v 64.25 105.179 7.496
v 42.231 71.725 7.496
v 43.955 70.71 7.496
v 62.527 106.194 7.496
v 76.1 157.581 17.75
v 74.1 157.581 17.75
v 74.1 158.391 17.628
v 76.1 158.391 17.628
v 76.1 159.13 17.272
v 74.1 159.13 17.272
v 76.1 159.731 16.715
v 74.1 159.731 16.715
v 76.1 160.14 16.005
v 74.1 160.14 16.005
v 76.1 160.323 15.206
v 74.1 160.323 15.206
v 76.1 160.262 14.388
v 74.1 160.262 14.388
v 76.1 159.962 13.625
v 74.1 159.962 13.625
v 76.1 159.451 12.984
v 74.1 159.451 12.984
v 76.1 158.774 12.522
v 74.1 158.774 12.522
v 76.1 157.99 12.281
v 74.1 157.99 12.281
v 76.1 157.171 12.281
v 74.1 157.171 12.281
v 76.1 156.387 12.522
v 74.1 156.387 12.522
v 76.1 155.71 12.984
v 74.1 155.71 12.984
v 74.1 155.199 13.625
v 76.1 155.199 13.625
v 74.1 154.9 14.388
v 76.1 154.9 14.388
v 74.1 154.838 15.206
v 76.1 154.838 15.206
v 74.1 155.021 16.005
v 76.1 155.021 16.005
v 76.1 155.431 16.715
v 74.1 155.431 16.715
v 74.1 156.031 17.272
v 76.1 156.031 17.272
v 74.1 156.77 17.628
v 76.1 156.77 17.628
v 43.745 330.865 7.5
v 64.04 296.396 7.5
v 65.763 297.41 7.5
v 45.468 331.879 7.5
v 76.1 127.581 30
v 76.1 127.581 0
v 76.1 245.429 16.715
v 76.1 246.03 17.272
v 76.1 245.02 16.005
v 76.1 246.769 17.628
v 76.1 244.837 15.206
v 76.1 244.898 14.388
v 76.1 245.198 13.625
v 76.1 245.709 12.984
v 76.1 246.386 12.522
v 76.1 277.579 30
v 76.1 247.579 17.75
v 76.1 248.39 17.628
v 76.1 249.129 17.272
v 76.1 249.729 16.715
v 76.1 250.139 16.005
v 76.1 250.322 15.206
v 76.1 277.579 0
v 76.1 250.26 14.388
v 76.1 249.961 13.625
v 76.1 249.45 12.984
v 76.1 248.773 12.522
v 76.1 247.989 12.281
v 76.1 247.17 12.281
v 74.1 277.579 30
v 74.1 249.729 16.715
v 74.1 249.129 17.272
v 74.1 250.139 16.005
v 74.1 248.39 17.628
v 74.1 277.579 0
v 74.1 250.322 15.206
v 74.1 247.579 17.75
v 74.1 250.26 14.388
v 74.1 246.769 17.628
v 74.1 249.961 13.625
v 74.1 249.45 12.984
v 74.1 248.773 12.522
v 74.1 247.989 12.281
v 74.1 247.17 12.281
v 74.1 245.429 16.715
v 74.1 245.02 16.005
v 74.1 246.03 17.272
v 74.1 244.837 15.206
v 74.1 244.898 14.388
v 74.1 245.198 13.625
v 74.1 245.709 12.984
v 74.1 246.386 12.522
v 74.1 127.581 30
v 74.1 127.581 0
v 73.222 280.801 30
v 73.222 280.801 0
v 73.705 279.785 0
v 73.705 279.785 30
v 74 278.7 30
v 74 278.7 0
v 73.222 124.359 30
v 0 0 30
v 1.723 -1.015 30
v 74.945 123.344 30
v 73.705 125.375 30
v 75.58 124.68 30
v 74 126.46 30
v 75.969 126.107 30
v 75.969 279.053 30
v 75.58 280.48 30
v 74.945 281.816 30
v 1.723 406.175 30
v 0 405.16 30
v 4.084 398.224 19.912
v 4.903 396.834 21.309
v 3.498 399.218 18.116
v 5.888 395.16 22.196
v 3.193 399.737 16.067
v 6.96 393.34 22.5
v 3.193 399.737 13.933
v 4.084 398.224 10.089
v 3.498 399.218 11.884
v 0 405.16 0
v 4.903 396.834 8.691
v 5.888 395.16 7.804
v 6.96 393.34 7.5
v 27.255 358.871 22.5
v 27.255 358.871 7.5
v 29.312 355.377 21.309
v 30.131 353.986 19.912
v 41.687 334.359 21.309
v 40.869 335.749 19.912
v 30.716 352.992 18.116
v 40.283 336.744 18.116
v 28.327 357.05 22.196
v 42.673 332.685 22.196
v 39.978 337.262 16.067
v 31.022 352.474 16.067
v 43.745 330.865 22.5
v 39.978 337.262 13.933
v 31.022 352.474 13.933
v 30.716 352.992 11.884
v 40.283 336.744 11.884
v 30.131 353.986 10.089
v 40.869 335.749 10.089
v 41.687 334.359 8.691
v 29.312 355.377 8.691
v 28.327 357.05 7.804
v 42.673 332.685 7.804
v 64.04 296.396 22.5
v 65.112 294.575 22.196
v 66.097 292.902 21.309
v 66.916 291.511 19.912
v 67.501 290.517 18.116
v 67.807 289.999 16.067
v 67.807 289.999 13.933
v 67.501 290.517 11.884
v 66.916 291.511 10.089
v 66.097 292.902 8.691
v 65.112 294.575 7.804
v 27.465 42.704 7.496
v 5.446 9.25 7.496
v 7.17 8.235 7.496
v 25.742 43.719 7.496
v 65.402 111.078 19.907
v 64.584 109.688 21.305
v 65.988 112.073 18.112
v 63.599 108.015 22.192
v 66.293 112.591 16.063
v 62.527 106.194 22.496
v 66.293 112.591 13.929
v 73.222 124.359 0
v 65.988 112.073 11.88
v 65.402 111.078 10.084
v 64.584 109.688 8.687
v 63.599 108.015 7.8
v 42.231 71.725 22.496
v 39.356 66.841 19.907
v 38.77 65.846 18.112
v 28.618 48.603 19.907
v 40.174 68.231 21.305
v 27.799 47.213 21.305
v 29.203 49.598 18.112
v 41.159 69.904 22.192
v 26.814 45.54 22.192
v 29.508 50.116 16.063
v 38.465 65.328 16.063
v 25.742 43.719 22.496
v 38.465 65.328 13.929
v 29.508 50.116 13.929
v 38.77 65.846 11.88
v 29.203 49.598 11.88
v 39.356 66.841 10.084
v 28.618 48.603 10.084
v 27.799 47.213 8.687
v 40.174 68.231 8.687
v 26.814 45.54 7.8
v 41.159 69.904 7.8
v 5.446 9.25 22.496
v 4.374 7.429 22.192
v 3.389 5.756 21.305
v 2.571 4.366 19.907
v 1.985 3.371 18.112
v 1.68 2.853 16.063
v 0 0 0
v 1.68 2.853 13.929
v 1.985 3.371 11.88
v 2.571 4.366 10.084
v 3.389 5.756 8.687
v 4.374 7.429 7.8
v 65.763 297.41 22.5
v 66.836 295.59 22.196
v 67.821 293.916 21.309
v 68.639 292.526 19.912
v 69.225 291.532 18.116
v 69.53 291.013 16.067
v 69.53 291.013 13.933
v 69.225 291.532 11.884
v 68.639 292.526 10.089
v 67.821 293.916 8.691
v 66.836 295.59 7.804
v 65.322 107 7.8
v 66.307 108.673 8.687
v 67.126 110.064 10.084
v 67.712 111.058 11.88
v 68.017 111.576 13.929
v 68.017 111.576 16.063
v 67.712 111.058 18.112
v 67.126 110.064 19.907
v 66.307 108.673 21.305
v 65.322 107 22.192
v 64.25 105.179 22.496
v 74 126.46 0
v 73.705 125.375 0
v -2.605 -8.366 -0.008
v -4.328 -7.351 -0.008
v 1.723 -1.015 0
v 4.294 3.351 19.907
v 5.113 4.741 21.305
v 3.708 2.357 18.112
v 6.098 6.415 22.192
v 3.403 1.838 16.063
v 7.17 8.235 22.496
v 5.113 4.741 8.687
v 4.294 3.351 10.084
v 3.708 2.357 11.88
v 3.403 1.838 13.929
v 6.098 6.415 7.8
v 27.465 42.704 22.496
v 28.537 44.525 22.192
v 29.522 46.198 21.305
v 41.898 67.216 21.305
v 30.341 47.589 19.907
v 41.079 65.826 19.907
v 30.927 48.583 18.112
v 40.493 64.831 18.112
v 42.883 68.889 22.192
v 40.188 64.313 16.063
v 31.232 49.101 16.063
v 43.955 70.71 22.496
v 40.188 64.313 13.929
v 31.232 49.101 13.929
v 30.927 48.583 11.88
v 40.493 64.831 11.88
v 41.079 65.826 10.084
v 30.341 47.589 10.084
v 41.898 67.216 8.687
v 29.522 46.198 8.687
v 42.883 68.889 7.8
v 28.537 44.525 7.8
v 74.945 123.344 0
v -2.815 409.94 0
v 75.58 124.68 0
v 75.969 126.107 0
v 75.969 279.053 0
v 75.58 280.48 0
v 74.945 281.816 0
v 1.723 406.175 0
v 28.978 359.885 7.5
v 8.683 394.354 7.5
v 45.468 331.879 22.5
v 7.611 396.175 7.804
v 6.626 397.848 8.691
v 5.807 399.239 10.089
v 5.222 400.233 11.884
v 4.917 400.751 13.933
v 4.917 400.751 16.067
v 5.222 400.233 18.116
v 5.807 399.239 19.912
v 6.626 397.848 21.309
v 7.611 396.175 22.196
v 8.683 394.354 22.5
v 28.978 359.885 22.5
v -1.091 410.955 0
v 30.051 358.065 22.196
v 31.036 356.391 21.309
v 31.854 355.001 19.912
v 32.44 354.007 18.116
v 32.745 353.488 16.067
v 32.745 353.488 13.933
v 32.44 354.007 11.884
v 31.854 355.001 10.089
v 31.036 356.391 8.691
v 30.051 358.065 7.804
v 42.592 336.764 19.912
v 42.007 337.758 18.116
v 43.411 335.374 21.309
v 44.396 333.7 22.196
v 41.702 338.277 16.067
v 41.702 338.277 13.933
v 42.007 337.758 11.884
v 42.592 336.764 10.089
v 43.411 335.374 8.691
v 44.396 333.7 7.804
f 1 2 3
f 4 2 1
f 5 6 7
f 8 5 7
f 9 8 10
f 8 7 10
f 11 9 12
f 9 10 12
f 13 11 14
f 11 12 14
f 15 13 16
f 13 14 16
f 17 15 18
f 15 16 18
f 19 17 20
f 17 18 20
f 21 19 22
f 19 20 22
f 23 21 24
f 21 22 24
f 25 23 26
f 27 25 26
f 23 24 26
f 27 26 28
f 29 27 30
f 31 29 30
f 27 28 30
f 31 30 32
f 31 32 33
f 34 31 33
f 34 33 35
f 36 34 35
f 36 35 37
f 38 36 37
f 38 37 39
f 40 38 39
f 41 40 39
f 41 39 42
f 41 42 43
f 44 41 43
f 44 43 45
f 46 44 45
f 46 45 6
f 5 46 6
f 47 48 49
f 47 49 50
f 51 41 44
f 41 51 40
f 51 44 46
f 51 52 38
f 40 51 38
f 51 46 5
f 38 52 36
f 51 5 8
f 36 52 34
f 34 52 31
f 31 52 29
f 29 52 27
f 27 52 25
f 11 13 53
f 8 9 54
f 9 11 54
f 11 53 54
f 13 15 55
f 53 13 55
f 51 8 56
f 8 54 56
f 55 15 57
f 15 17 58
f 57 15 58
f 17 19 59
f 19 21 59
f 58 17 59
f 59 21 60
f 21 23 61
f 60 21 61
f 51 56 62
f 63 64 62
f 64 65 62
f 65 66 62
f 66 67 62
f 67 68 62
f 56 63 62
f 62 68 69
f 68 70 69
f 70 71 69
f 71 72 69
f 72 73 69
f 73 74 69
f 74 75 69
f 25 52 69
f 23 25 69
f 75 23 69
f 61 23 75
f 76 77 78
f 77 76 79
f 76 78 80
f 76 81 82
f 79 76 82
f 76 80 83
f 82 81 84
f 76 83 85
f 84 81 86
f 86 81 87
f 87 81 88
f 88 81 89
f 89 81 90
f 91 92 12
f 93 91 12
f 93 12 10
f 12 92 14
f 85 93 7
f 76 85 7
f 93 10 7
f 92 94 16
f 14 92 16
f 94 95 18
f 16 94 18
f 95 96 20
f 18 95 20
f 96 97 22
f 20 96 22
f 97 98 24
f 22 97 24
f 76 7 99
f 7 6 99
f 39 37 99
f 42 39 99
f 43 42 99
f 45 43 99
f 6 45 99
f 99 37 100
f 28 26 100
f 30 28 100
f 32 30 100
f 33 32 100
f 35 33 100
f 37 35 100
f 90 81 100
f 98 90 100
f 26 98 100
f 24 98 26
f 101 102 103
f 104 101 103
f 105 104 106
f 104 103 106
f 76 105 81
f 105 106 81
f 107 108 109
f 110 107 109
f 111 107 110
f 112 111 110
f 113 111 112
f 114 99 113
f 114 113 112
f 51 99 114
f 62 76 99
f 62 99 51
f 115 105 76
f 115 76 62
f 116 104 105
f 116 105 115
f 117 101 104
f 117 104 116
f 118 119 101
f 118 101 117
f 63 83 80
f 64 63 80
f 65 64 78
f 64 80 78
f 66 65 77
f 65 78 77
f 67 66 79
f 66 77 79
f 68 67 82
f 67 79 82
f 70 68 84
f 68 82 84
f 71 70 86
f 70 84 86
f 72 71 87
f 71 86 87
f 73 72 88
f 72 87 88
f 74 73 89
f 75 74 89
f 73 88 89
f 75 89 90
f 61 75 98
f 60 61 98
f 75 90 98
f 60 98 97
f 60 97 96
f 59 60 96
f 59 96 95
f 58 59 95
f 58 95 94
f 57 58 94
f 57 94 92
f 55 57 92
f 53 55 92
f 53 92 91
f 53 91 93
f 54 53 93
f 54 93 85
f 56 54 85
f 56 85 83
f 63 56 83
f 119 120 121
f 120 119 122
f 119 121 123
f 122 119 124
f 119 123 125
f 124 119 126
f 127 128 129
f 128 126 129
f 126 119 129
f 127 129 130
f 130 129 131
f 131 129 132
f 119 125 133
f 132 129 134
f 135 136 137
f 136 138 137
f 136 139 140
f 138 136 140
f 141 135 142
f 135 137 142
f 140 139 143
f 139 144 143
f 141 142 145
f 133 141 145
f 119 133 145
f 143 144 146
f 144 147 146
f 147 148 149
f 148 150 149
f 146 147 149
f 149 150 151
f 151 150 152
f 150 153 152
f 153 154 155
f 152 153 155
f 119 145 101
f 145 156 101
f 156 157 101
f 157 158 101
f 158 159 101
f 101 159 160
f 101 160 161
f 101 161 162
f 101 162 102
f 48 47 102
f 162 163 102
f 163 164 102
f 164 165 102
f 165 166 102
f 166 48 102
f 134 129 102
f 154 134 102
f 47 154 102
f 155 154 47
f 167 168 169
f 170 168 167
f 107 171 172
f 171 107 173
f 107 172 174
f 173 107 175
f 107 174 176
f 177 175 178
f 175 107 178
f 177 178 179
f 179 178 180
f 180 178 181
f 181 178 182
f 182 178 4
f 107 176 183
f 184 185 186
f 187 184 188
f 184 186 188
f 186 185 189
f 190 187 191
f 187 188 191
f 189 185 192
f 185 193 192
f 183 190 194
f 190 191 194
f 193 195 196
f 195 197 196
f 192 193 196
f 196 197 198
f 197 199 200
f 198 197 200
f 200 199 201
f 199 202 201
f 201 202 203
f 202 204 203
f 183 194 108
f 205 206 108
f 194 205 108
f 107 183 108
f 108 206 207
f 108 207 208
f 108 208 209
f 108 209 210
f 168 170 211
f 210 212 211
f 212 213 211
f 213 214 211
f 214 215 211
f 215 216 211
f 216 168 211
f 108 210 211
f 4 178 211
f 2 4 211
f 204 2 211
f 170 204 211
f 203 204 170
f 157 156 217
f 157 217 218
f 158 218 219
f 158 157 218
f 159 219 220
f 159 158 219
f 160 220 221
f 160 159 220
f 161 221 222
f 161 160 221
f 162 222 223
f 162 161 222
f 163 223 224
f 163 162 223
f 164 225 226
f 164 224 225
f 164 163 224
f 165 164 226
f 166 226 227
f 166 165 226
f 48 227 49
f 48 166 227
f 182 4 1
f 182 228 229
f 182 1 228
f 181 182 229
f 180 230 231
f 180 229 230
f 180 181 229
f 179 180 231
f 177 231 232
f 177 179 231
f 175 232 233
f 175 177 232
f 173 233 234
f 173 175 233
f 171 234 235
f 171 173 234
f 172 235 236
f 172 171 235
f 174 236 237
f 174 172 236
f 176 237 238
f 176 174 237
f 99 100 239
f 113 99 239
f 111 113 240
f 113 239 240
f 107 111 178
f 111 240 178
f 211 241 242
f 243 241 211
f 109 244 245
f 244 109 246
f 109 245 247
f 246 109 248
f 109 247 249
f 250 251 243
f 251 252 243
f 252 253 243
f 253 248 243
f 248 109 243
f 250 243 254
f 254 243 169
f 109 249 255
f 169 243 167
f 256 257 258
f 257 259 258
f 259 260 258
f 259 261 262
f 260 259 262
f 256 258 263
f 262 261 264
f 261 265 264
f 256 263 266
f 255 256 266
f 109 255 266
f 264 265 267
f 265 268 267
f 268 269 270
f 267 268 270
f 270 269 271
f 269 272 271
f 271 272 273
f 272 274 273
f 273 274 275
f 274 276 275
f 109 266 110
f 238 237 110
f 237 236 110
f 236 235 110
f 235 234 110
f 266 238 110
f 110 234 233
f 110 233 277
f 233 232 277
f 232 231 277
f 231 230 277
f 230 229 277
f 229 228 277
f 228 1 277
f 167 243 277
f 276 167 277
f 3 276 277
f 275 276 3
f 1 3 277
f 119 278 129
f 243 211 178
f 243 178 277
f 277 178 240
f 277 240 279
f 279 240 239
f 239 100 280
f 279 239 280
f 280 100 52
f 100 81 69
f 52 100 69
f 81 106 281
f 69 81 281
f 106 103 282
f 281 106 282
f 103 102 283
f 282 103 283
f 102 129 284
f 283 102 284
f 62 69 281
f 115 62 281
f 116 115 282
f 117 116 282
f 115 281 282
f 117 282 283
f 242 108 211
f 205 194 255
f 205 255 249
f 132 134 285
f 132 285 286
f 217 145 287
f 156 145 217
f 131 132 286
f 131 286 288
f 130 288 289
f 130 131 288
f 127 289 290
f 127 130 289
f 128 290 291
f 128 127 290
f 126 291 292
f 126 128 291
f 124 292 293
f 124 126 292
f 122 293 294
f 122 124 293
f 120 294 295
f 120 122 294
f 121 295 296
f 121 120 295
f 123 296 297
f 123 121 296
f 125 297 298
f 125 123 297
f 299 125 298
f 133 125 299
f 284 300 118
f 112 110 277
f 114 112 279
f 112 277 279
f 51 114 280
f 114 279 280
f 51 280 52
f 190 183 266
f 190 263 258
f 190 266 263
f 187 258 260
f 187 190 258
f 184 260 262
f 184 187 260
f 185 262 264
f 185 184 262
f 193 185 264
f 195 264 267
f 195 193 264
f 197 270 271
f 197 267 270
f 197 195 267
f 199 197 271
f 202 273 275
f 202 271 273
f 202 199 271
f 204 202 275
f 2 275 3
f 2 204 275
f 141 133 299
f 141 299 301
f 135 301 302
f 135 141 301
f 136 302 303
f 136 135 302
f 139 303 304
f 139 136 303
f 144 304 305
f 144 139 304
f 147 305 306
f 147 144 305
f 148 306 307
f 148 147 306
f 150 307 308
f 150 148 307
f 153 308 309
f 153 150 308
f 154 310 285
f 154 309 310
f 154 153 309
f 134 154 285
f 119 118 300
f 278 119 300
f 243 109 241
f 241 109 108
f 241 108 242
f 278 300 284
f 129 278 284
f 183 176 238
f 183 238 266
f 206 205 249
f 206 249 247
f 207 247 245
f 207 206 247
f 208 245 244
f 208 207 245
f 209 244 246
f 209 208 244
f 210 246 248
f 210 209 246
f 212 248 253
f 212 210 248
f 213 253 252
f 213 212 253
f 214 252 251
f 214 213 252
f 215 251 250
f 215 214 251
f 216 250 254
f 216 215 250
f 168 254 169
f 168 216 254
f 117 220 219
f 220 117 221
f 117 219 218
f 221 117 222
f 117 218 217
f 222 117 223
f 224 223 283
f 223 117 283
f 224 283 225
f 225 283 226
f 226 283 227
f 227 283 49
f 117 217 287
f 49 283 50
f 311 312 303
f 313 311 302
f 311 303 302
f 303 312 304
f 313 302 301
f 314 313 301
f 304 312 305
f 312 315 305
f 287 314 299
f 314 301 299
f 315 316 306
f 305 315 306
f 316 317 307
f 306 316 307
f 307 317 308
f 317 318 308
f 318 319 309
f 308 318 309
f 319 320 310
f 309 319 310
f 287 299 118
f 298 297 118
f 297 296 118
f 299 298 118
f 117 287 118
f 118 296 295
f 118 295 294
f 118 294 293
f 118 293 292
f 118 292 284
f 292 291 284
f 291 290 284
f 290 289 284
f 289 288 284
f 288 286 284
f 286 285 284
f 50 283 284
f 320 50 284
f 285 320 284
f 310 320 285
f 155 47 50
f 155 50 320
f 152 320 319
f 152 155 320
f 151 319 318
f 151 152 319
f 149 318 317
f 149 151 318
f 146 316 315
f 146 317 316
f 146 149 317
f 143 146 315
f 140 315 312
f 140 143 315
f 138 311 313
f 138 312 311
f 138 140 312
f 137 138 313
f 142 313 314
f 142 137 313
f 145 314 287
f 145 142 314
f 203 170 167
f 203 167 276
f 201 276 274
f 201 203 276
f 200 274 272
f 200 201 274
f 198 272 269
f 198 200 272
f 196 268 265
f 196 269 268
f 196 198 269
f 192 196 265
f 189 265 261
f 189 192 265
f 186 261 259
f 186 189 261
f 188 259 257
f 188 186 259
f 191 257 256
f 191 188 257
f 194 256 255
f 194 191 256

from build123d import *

# Parameters (mm, degrees)
ODGI_CIE_BAZOWE1_DEPTH      = 30
OTW_R_POD_RUB_M51_D         = 5.5
OTW_R_POD_RUB_M51_DEPTH     = 14
OTW_R_POD_RUB_M51_TIP       = 1.652366702
DODANIE_WYCI_GNI_CIE1_DEPTH = 2
DODANIE_WYCI_GNI_CIE2_DEPTH = 2
WYTNIJ_WYCI_GNI_CIE1_DEPTH  = 10
WYTNIJ_WYCI_GNI_CIE3_DEPTH  = 10


# Sheet-metal steps are written as plain solids
with BuildPart() as part:
    # Szkic1 → Odgięcie bazowe1 (new body)
    with BuildSketch(Plane.XY):
        with BuildLine():
            Line((0, 405.16), (73.22194051, 280.801279174))
            ThreePointArc((73.22194051, 280.801279174), (73.876553772, 279.249103741), (74.1, 277.579421472))
            Line((74.1, 277.579421472), (74.1, 127.580578528))
            ThreePointArc((74.1, 127.580578528), (73.876553772, 125.910896259), (73.22194051, 124.358720826))
            Line((73.22194051, 124.358720826), (0, 0))
            Line((0, 0), (1.72344583, -1.014758331))
            Line((1.72344583, -1.014758331), (74.94538634, 123.343962495))
            ThreePointArc((74.94538634, 123.343962495), (75.806177007, 125.38501208), (76.1, 127.580578528))
            Line((76.1, 127.580578528), (76.1, 277.579421472))
            ThreePointArc((76.1, 277.579421472), (75.806177007, 279.77498792), (74.94538634, 281.816037505))
            Line((74.94538634, 281.816037505), (1.72344583, 406.174758331))
            Line((1.72344583, 406.174758331), (0, 405.16))
        make_face()
    extrude(amount=ODGI_CIE_BAZOWE1_DEPTH)

    # Otwór pod śrubę M51
    with Locations(Plane(origin=(76.1, 0, 0), x_dir=(0, 0, -1), z_dir=(1, 0, 0))):
        with Locations((-15, 157.580578528), (-15, 247.579421472)):
            Hole(OTW_R_POD_RUB_M51_D / 2, depth=OTW_R_POD_RUB_M51_DEPTH)
            with Locations((0, 0, -(OTW_R_POD_RUB_M51_DEPTH + OTW_R_POD_RUB_M51_TIP / 2))):  # 118° drill point
                Cone(0, OTW_R_POD_RUB_M51_D / 2, OTW_R_POD_RUB_M51_TIP, mode=Mode.SUBTRACT)

    # Szkic10 → Dodanie-wyciągnięcie1 (add)
    with BuildSketch(Plane(origin=(178.867603803, 105.316562907, 0), x_dir=(0, 0, -1), z_dir=(0.8617229149967045, 0.5073791656833994, 0))):
        Polygon((-30, 349.13565624), (-0.000160653, 354.682794047), (0, 349.13565624), align=None)
    extrude(amount=-DODANIE_WYCI_GNI_CIE1_DEPTH)

    # Szkic11 → Dodanie-wyciągnięcie2 (add)
    with BuildSketch(Plane(origin=(1.72344583, -1.014758331, 0), x_dir=(0, 0, -1), z_dir=(0.8617229149967046, -0.507379165683399, 0))):
        Polygon((-30, 0), (0.008092813, -8.531045483), (0, 0), align=None)
    extrude(amount=-DODANIE_WYCI_GNI_CIE2_DEPTH)

    # Szkic13 → Wytnij-wyciągnięcie1 (cut)
    with BuildSketch(Plane(origin=(0, 0, 0), x_dir=(0, 0, 1), z_dir=(-0.8617229149967046, 0.5073791656833994, 0))):
        with BuildLine():
            Line((7.495953593, 10.734477259), (7.495953593, 50.734477259))
            ThreePointArc((7.495953593, 50.734477259), (14.995953593, 58.234477259), (22.495953593, 50.734477259))
            Line((22.495953593, 50.734477259), (22.495953593, 10.734477259))
            ThreePointArc((22.495953593, 10.734477259), (14.995953593, 3.234477259), (7.495953593, 10.734477259))
        make_face()
        with BuildLine():
            Line((7.495953593, 83.234477259), (7.495953593, 123.234477259))
            ThreePointArc((7.495953593, 123.234477259), (14.995953593, 130.734477259), (22.495953593, 123.234477259))
            Line((22.495953593, 123.234477259), (22.495953593, 83.234477259))
            ThreePointArc((22.495953593, 83.234477259), (14.995953593, 75.734477259), (7.495953593, 83.234477259))
        make_face()
    extrude(amount=-WYTNIJ_WYCI_GNI_CIE1_DEPTH, mode=Mode.SUBTRACT)

    # Szkic12 → Wytnij-wyciągnięcie3 (cut)
    with BuildSketch(Plane(origin=(177.144157973, 104.301804576, 0), x_dir=(0, 0, 1), z_dir=(-0.8617229149967045, -0.5073791656833994, 0))):
        with BuildLine():
            Line((22.500080327, 335.4184445), (22.500080327, 295.4184445))
            ThreePointArc((22.500080327, 295.4184445), (15.000080327, 287.9184445), (7.500080327, 295.4184445))
            Line((7.500080327, 295.4184445), (7.500080327, 335.4184445))
            ThreePointArc((7.500080327, 335.4184445), (15.000080327, 342.9184445), (22.500080327, 335.4184445))
        make_face()
        with BuildLine():
            Line((22.500080327, 262.9184445), (22.500080327, 222.9184445))
            ThreePointArc((22.500080327, 222.9184445), (15.000080327, 215.4184445), (7.500080327, 222.9184445))
            Line((7.500080327, 222.9184445), (7.500080327, 262.9184445))
            ThreePointArc((7.500080327, 262.9184445), (15.000080327, 270.4184445), (22.500080327, 262.9184445))
        make_face()
    extrude(amount=-WYTNIJ_WYCI_GNI_CIE3_DEPTH, mode=Mode.SUBTRACT)


solid = part.part
